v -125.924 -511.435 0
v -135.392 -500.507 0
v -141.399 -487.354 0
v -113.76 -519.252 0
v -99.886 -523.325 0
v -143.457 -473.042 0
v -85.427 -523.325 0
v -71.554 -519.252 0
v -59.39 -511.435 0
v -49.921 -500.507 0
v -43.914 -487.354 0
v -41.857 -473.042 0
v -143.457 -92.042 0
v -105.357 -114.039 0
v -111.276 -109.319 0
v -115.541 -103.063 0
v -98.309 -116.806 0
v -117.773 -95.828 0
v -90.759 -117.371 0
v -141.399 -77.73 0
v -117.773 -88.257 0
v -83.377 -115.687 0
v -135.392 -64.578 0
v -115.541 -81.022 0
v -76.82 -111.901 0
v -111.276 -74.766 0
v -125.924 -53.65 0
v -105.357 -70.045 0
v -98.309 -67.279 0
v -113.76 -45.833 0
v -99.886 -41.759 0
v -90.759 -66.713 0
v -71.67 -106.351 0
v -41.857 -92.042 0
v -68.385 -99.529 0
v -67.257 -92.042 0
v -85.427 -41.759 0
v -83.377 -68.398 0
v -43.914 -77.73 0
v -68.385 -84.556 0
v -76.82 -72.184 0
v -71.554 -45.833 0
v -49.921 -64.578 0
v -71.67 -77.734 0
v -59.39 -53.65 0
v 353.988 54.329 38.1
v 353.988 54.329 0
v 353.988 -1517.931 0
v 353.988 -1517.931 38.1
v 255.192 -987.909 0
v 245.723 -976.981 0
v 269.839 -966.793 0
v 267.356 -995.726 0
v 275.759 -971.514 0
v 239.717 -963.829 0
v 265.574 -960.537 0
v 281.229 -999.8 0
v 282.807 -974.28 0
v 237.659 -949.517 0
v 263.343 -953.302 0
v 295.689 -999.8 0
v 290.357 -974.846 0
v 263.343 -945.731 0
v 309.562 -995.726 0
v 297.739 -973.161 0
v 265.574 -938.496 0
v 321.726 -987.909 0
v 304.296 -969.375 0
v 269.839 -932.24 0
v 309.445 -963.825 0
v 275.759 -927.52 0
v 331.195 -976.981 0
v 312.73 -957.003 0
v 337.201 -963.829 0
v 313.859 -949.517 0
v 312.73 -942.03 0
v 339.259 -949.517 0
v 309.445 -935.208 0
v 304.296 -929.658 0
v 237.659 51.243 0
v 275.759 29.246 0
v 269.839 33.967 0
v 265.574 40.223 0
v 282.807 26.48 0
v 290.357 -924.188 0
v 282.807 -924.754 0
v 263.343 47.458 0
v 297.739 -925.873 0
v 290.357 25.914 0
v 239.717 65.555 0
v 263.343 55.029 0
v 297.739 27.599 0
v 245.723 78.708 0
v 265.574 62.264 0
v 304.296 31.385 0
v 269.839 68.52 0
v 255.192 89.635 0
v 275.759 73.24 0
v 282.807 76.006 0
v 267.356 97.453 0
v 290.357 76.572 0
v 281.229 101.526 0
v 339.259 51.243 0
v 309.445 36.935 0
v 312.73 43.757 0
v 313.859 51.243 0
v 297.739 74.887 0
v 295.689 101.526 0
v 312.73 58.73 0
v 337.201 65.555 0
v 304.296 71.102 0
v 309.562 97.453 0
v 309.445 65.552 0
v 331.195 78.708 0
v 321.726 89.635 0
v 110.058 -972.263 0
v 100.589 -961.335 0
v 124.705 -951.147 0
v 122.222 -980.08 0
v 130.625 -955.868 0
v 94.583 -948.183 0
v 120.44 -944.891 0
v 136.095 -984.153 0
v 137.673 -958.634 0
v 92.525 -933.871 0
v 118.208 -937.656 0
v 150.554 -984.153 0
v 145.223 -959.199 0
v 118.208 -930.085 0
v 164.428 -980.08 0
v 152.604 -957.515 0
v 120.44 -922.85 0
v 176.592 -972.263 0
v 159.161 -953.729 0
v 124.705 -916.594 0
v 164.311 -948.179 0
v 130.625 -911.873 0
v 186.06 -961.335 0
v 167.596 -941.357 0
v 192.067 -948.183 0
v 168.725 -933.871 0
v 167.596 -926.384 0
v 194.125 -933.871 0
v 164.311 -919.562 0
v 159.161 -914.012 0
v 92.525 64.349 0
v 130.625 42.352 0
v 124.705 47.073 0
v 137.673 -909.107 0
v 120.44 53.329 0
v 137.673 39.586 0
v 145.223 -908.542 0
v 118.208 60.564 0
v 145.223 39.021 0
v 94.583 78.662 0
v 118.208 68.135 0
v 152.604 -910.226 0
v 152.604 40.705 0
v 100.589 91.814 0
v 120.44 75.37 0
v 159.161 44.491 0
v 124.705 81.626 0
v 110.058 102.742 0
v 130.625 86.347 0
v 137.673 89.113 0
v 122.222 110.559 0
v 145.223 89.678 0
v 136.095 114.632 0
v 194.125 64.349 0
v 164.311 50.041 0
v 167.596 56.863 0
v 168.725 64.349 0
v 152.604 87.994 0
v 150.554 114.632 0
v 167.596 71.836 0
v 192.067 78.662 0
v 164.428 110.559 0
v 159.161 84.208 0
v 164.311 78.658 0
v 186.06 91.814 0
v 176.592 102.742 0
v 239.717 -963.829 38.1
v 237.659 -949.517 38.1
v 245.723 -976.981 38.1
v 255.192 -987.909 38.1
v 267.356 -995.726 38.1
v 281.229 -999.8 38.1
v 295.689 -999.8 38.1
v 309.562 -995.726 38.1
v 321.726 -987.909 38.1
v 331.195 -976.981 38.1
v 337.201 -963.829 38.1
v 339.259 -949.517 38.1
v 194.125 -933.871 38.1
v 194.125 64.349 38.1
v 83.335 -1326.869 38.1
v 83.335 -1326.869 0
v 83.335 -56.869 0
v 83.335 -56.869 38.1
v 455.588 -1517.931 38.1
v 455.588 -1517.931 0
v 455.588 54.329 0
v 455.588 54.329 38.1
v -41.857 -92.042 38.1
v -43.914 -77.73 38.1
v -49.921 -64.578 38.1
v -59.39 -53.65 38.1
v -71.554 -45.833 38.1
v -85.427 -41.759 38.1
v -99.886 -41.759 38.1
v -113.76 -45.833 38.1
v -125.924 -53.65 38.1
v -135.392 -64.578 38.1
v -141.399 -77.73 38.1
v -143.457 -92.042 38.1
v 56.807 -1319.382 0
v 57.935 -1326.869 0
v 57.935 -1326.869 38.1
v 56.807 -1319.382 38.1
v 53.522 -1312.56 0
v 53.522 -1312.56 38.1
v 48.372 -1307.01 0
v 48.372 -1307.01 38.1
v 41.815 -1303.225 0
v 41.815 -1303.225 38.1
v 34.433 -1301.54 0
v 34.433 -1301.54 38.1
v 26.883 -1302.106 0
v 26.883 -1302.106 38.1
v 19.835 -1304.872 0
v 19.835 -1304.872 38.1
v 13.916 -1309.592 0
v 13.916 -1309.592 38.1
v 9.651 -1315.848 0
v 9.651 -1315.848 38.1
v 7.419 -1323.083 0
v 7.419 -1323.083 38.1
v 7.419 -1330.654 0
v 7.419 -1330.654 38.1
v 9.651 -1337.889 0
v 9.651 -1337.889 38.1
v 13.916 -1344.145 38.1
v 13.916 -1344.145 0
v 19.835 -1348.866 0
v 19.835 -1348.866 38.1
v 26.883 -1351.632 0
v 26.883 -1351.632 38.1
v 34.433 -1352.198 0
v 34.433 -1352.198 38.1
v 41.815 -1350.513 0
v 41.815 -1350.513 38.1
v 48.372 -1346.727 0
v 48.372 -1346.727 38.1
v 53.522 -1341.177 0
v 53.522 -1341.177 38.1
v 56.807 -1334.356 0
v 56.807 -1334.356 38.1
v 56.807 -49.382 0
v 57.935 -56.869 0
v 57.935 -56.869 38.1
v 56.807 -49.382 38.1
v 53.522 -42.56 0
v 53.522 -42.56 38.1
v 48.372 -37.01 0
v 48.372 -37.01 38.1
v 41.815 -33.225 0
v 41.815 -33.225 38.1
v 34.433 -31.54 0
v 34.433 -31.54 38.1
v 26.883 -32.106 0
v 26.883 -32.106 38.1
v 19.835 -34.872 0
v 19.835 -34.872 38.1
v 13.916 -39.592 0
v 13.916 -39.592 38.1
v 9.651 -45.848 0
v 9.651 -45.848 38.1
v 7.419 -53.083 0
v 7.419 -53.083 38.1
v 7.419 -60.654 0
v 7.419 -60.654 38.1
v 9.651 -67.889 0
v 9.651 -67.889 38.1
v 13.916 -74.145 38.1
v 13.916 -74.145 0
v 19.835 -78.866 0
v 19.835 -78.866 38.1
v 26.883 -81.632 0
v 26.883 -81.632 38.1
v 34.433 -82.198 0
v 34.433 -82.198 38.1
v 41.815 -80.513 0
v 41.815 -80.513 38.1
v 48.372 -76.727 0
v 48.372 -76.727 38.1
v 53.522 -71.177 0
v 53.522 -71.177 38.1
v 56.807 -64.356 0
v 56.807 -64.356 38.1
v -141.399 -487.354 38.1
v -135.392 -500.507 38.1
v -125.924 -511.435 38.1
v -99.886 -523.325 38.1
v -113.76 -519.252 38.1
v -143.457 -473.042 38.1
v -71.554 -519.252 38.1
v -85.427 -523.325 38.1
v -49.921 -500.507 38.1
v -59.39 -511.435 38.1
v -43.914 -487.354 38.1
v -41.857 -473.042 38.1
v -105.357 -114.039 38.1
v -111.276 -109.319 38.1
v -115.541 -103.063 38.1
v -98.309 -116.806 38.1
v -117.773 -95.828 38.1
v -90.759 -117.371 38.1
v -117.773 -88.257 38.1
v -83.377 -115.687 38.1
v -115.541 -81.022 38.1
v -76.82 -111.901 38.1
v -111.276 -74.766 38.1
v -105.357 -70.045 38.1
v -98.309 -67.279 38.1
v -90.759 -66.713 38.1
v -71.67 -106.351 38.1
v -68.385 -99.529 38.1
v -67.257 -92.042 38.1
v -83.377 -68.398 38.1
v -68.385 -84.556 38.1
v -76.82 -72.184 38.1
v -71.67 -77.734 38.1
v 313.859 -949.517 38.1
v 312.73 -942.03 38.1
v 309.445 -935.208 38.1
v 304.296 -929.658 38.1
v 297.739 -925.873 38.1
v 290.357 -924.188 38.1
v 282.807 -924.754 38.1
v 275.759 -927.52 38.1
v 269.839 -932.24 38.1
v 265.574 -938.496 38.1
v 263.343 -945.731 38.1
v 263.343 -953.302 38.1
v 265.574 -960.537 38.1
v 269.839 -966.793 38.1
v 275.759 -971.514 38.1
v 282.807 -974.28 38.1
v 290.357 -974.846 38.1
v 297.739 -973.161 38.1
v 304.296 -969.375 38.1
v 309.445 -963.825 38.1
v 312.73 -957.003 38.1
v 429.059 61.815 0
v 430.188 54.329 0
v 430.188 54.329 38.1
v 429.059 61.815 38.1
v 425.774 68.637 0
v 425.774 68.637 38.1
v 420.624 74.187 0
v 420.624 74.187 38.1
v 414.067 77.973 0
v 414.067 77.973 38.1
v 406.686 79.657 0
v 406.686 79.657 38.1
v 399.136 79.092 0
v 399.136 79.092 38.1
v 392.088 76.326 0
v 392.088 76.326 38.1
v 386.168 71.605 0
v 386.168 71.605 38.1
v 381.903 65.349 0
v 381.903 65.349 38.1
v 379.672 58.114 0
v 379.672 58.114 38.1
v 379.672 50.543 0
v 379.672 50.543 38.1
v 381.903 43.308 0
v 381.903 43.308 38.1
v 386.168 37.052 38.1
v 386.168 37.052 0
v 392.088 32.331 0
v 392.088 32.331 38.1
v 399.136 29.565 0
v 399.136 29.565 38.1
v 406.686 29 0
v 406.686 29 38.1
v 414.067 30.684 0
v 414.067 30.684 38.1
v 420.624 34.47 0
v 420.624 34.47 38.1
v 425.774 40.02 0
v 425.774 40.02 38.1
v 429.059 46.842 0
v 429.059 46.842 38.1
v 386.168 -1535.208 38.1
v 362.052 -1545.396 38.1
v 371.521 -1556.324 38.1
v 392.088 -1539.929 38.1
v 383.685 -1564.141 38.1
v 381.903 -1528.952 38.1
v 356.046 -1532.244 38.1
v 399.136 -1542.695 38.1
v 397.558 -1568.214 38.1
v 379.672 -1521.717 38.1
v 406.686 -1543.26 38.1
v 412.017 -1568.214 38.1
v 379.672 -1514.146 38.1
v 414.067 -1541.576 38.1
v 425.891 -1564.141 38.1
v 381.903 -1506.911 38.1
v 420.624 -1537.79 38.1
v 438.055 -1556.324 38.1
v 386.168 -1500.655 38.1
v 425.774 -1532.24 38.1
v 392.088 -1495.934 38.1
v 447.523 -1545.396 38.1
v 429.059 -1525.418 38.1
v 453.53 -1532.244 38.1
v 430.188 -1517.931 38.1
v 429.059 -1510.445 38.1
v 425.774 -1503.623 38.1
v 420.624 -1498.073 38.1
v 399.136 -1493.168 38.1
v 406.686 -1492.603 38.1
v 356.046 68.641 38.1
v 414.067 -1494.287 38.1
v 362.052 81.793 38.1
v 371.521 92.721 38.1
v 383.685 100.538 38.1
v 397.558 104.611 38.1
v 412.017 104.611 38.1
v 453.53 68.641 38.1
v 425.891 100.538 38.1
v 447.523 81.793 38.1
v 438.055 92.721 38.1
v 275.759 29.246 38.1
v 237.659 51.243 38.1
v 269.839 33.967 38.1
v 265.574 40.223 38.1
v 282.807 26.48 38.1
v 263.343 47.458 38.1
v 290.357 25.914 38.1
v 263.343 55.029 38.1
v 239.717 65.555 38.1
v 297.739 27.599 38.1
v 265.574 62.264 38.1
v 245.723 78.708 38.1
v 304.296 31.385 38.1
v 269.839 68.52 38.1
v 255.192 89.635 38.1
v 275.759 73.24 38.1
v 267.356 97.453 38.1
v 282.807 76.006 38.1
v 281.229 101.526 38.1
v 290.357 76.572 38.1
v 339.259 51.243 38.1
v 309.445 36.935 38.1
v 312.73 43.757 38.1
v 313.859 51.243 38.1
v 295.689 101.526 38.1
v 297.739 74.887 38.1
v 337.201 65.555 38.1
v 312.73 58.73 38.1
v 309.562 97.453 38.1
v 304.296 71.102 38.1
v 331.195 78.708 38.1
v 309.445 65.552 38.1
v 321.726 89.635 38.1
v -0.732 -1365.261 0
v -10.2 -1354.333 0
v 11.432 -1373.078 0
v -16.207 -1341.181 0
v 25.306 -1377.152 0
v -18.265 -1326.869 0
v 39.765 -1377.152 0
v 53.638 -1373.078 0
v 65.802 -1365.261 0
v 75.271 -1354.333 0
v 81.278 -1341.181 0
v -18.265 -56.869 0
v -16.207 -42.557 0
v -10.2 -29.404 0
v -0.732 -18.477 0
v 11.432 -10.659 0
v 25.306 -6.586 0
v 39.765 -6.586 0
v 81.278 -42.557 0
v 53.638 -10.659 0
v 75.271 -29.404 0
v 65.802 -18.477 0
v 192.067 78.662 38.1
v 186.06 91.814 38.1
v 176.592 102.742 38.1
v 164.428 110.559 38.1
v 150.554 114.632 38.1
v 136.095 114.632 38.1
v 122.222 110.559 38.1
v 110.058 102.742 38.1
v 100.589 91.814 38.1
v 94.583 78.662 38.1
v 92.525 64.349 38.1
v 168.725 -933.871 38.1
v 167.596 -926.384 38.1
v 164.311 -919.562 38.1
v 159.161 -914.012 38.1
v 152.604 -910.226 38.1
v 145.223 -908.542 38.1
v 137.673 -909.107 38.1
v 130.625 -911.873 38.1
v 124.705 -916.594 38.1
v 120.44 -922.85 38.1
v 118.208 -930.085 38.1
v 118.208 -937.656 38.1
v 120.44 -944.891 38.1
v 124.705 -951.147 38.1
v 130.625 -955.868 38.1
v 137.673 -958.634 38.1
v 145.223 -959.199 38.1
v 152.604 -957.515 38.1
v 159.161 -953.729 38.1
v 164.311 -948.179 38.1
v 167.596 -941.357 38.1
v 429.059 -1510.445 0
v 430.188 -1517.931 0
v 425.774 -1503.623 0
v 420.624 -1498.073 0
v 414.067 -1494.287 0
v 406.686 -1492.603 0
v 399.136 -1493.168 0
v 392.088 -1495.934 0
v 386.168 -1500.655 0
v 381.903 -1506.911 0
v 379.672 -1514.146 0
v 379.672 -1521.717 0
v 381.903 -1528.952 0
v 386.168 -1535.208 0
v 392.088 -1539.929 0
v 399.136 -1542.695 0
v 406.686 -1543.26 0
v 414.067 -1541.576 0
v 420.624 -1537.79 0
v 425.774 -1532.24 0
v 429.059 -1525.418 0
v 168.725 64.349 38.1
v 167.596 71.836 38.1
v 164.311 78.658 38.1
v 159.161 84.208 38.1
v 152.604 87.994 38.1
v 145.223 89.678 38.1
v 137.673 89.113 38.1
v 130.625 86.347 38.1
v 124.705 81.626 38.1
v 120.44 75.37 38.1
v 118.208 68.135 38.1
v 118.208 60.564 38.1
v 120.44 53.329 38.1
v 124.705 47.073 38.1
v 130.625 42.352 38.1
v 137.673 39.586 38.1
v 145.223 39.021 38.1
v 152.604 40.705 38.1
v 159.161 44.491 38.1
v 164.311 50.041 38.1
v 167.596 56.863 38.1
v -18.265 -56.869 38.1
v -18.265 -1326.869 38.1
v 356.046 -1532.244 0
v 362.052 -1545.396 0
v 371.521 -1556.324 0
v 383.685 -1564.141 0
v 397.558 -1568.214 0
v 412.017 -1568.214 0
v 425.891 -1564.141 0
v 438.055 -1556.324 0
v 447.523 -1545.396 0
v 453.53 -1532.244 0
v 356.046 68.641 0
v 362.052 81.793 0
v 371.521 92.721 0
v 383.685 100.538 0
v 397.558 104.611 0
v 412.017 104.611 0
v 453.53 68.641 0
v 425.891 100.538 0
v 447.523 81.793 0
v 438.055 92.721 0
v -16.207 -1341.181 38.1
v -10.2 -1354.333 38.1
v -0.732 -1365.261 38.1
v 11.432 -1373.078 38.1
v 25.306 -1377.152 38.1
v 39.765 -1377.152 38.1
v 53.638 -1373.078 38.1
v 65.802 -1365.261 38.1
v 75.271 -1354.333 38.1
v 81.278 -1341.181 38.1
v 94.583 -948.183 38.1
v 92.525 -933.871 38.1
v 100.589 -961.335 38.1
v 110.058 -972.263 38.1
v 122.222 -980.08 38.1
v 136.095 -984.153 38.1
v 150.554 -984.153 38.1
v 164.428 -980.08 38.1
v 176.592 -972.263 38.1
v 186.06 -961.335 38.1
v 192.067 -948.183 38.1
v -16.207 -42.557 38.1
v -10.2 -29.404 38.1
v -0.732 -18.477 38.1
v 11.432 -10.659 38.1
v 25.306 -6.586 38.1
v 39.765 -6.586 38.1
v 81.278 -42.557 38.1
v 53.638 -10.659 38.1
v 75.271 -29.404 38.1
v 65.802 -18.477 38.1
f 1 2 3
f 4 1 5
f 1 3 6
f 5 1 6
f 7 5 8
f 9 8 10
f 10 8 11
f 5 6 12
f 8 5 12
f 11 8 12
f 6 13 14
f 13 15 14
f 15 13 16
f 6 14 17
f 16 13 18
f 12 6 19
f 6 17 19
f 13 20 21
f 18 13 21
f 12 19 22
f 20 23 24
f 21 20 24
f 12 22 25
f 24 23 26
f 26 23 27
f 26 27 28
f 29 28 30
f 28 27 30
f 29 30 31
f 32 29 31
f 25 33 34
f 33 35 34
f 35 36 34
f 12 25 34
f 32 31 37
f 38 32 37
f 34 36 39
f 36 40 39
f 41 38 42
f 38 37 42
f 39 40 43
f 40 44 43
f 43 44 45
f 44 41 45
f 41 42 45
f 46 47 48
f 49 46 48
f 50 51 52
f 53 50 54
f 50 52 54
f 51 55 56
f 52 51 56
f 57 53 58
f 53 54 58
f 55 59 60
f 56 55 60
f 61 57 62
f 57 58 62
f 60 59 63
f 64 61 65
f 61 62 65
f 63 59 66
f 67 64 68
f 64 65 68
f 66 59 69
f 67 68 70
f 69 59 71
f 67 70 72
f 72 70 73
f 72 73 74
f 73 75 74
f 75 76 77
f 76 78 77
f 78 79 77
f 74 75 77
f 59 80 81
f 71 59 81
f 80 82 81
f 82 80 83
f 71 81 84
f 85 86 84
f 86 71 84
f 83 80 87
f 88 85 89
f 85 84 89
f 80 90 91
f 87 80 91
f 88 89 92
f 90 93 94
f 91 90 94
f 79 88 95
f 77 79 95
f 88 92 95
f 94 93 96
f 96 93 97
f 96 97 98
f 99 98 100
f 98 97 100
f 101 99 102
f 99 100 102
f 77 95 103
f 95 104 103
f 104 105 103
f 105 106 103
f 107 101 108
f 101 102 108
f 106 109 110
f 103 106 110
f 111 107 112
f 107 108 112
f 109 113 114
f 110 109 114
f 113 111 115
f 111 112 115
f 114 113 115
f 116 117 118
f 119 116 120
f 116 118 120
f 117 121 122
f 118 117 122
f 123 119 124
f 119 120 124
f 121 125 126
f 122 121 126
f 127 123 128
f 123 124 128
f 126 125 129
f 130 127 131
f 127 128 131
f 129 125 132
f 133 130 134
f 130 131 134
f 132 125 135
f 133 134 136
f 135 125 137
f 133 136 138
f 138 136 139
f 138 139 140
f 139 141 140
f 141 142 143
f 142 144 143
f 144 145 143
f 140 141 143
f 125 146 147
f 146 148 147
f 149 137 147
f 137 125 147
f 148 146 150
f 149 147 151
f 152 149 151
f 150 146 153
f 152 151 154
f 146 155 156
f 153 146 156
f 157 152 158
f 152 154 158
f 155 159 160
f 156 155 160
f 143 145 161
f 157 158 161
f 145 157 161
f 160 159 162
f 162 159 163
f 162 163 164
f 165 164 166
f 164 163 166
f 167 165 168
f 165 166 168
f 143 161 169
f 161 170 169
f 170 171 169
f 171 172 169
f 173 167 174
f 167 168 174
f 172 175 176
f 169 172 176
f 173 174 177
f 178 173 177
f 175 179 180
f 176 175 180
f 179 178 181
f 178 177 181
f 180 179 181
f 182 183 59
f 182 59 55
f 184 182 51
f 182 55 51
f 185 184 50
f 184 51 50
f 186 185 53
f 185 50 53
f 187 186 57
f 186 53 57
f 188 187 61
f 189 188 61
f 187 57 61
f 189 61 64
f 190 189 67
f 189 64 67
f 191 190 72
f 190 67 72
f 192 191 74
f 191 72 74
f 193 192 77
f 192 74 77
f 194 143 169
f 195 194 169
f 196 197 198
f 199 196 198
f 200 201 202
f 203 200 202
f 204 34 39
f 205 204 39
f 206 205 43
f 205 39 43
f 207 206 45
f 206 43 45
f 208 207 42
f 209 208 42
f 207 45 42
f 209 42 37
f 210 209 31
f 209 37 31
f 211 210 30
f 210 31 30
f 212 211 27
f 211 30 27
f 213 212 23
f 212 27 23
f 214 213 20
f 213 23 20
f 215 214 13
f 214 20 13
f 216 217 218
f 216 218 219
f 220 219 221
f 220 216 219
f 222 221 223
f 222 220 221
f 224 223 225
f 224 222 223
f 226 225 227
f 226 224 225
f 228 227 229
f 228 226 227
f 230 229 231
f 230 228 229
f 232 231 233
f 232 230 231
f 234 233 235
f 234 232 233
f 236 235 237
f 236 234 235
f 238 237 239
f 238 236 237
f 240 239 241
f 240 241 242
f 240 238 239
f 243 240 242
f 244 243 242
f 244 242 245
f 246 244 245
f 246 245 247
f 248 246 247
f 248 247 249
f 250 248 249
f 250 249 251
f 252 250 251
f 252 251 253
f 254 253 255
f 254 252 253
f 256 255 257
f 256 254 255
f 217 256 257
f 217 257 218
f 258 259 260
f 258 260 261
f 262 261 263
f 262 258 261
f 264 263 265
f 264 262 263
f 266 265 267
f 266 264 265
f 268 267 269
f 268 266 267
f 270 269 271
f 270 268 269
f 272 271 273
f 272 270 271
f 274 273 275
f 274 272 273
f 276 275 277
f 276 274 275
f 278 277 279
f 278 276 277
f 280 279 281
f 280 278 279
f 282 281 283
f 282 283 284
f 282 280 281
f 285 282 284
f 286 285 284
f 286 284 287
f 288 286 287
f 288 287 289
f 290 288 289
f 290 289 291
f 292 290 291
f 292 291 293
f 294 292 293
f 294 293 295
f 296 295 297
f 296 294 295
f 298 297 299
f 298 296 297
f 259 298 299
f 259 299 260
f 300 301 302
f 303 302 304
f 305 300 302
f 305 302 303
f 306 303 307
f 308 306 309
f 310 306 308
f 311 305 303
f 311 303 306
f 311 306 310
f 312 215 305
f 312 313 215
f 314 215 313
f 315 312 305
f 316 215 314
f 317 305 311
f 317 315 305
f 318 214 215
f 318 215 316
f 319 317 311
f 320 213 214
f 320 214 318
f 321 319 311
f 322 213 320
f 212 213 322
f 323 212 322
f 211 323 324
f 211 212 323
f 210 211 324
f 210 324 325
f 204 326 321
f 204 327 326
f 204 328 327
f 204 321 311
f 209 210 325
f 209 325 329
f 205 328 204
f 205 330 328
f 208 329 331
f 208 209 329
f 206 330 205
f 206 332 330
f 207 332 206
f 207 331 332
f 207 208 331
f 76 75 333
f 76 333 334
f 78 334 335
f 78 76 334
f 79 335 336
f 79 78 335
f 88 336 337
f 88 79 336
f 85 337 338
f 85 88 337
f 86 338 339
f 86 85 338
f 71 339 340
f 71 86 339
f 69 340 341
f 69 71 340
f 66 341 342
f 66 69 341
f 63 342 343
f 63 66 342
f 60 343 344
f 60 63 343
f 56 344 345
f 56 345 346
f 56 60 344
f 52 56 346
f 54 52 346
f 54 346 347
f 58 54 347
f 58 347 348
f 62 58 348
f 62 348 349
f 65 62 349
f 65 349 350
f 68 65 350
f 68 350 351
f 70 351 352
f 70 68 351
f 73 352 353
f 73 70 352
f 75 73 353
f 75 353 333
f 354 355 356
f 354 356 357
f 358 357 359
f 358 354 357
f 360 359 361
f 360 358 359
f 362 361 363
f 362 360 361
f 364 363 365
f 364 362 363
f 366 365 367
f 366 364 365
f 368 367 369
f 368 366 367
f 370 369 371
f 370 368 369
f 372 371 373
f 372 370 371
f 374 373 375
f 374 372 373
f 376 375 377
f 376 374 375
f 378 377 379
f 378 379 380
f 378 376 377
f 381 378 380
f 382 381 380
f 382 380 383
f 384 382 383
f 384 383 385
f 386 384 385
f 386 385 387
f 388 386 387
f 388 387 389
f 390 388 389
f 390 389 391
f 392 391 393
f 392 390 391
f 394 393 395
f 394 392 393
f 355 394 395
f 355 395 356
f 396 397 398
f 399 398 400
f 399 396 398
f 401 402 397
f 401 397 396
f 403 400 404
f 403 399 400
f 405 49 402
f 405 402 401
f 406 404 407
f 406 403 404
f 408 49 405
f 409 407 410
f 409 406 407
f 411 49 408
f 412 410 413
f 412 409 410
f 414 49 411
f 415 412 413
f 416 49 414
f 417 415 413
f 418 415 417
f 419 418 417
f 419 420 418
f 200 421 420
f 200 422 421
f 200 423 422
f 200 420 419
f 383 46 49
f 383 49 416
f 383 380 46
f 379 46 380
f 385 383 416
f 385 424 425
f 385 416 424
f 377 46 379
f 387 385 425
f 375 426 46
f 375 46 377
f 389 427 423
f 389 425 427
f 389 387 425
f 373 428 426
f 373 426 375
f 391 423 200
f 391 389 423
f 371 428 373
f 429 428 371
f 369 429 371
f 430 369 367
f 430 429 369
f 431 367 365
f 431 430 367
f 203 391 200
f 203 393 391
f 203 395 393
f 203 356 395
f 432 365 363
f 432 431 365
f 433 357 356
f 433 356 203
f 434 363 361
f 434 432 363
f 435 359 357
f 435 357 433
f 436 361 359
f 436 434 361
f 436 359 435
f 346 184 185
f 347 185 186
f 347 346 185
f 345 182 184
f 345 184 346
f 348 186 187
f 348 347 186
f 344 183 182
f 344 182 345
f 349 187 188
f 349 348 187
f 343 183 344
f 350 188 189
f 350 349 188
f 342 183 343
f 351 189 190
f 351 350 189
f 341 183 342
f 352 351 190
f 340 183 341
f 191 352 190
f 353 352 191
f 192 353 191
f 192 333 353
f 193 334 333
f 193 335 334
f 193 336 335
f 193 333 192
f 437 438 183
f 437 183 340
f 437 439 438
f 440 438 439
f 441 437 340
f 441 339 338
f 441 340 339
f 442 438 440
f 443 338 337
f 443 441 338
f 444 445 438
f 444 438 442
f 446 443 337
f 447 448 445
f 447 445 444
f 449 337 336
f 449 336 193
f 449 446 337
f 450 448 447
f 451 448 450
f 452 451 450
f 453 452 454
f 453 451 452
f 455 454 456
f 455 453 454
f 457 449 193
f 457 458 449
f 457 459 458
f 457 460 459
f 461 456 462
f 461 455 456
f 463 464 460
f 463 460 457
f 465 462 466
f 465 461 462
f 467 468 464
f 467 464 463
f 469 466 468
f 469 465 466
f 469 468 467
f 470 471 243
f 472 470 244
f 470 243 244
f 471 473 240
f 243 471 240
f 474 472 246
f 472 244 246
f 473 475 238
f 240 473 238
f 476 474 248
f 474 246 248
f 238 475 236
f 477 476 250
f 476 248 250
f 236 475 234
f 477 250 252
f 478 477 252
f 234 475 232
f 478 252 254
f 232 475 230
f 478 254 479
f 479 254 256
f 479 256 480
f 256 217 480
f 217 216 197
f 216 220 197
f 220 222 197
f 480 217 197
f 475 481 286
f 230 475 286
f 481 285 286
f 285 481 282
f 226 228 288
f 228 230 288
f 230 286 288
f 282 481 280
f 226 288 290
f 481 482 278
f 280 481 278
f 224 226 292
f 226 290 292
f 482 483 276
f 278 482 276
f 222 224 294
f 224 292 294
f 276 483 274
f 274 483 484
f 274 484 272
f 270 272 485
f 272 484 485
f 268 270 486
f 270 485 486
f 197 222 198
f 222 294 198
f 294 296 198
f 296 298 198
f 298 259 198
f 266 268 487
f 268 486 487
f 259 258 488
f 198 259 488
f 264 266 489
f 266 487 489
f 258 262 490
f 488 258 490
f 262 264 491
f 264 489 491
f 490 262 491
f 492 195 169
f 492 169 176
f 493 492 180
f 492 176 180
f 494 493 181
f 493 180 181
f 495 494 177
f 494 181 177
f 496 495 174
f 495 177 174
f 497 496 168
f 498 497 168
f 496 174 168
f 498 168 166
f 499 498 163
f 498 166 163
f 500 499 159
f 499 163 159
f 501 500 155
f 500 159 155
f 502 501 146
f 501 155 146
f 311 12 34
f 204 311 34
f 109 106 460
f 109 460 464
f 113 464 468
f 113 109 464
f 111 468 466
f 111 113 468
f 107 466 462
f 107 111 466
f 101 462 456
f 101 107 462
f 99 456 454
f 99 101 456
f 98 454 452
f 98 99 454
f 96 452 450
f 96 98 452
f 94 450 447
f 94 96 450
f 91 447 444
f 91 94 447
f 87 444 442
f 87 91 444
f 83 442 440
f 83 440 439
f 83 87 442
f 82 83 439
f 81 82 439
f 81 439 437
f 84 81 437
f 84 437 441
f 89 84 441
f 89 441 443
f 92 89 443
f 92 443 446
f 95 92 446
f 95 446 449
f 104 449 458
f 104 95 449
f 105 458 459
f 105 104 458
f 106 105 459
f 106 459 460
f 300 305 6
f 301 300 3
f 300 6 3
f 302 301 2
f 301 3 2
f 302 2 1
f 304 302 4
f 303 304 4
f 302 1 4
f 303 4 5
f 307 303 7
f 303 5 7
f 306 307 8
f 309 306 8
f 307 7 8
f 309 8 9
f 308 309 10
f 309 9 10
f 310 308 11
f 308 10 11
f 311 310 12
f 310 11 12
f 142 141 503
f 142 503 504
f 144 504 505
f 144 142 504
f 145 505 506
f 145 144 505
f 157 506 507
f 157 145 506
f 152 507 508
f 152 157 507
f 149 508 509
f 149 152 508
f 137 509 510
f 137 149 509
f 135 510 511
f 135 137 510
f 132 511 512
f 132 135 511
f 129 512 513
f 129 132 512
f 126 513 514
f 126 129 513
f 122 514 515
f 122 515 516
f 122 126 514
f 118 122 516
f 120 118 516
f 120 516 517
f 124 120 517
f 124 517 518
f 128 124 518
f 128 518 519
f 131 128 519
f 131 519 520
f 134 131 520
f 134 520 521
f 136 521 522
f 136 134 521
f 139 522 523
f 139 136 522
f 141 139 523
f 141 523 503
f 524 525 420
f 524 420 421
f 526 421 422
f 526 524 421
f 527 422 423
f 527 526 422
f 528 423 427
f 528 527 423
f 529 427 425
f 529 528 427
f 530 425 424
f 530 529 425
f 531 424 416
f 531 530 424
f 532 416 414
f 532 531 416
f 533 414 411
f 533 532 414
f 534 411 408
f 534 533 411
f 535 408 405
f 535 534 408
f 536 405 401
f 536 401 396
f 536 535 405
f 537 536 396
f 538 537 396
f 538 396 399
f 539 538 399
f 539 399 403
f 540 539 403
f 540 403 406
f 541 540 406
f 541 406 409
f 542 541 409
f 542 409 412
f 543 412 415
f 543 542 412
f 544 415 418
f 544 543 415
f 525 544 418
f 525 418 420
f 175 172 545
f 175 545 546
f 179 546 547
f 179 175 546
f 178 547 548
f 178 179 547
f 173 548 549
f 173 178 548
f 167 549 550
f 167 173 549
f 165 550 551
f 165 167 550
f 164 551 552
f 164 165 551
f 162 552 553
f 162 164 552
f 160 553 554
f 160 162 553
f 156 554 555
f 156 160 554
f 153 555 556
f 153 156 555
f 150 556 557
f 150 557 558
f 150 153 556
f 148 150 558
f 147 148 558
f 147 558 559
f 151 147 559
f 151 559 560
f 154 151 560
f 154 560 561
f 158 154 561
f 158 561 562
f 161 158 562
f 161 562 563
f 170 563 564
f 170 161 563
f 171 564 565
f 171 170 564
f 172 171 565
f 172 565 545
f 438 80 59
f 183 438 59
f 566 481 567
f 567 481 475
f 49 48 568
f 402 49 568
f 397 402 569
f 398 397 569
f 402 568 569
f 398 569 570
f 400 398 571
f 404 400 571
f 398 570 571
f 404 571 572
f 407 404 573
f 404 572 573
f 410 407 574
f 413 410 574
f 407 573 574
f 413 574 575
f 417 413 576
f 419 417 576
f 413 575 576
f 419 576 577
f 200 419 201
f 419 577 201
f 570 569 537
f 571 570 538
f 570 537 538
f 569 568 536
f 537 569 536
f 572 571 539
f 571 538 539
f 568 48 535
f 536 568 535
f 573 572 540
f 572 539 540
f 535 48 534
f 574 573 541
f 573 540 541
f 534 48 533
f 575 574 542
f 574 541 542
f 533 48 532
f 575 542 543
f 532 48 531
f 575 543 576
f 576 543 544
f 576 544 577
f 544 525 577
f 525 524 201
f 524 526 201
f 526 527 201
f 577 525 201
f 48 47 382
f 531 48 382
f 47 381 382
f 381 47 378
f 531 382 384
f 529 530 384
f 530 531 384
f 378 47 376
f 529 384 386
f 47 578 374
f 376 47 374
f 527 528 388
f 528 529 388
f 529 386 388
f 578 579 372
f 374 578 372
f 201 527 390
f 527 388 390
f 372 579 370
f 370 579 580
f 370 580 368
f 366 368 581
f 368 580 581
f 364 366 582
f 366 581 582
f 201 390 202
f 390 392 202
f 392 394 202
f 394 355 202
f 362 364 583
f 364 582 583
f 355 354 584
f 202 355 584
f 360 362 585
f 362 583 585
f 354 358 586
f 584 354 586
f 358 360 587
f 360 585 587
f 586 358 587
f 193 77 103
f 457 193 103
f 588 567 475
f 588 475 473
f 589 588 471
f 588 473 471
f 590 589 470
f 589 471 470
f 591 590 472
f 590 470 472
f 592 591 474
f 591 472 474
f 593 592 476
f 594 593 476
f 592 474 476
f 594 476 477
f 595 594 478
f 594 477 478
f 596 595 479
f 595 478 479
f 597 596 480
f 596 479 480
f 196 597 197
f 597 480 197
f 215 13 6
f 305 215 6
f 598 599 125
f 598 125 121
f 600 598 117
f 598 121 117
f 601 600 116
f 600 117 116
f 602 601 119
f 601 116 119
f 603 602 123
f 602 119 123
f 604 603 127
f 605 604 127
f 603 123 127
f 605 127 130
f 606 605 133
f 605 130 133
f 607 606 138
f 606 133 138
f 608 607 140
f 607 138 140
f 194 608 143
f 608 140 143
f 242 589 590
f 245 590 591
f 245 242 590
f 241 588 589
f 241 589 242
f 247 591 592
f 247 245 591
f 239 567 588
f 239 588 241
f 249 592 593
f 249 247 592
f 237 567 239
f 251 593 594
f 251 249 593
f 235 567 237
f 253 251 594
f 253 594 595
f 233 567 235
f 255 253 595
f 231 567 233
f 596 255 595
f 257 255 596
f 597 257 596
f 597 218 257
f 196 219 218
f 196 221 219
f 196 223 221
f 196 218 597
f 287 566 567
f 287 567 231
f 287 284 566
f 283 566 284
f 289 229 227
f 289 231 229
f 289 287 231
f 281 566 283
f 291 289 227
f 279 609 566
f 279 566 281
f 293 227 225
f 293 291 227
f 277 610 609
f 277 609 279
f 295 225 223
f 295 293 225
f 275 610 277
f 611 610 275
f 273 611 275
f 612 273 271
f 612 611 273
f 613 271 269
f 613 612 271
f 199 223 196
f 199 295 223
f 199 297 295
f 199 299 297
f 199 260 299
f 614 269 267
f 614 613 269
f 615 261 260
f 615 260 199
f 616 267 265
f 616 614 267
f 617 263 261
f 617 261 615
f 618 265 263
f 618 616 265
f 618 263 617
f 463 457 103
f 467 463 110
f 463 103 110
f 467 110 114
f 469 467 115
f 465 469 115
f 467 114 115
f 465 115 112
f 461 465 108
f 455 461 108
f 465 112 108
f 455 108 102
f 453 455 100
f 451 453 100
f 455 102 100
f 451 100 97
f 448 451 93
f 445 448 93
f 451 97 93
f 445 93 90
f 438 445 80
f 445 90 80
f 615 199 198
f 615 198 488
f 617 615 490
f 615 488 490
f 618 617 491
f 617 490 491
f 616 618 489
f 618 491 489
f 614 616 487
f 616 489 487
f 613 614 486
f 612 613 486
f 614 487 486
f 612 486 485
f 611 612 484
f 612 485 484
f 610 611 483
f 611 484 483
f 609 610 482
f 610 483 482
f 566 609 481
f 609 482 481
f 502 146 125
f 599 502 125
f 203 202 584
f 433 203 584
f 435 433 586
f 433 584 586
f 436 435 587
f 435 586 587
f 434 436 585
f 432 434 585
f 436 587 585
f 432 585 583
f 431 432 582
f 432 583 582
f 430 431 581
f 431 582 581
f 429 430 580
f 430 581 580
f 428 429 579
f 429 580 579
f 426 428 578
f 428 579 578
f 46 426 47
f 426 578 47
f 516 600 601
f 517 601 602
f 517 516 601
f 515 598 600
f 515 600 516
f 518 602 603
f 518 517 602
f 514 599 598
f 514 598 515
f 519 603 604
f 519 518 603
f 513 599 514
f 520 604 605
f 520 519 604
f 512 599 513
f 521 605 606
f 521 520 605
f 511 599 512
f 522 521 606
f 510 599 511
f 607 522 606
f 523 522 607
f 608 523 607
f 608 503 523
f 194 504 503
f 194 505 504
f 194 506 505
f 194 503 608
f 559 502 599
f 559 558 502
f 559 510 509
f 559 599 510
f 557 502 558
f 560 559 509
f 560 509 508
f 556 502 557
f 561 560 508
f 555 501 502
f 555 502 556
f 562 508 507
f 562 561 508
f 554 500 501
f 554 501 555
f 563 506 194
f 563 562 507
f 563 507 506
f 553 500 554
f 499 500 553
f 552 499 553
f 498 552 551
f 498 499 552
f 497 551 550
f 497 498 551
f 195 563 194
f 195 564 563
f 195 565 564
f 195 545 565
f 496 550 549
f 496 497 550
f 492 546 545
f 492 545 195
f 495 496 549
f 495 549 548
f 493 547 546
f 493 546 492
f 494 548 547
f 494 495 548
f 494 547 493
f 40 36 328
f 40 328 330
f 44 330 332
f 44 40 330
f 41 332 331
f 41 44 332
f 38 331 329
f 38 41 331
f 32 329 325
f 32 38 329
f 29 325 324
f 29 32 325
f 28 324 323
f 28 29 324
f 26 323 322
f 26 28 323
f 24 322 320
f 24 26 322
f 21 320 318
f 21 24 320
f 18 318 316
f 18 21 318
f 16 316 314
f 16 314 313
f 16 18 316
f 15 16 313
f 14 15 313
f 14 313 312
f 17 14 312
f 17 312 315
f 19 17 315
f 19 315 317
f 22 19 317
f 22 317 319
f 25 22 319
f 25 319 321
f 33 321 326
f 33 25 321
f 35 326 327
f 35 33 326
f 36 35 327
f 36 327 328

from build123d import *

# Parameters (mm, degrees)
F0_R     = 25.4
F1_DEPTH = 38.1


with BuildPart() as f1:
    # F0 (on Top) → F1 (new body)
    with BuildSketch(Plane.XY):
        with BuildLine():
            Line((-143.456717, -92.042427), (-143.456717, -473.042427))
            ThreePointArc((-143.456717, -473.042427), (-92.656717, -523.842427), (-41.856717, -473.042427))
            Line((-41.856717, -473.042427), (-41.856717, -92.042427))
            ThreePointArc((-41.856717, -92.042427), (-92.656717, -41.242427), (-143.456717, -92.042427))
        make_face()
        with Locations((-92.656717, -473.042427)):
            Circle(F0_R, mode=Mode.SUBTRACT)
        with Locations((-92.656717, -92.042427)):
            Circle(F0_R, mode=Mode.SUBTRACT)
        with BuildLine():
            Line((-18.264667, -56.868742), (-18.264667, -1326.868742))
            ThreePointArc((-18.264667, -1326.868742), (32.535333, -1377.668742), (83.335333, -1326.868742))
            Line((83.335333, -1326.868742), (83.335333, -56.868742))
            ThreePointArc((83.335333, -56.868742), (32.535333, -6.068742), (-18.264667, -56.868742))
        make_face()
        with Locations((32.535333, -1326.868742)):
            Circle(F0_R, mode=Mode.SUBTRACT)
        with Locations((32.535333, -56.868742)):
            Circle(F0_R, mode=Mode.SUBTRACT)
        with BuildLine():
            Line((92.524763, 64.349489), (92.524763, -933.870511))
            ThreePointArc((92.524763, -933.870511), (143.324763, -984.670511), (194.124763, -933.870511))
            Line((194.124763, -933.870511), (194.124763, 64.349489))
            ThreePointArc((194.124763, 64.349489), (143.324763, 115.149489), (92.524763, 64.349489))
        make_face()
        with Locations((143.324763, -933.870511)):
            Circle(F0_R, mode=Mode.SUBTRACT)
        with Locations((143.324763, 64.349489)):
            Circle(F0_R, mode=Mode.SUBTRACT)
        with BuildLine():
            Line((237.658914, 51.24329), (237.658914, -949.51671))
            ThreePointArc((237.658914, -949.51671), (288.458914, -1000.31671), (339.258914, -949.51671))
            Line((339.258914, -949.51671), (339.258914, 51.24329))
            ThreePointArc((339.258914, 51.24329), (288.458914, 102.04329), (237.658914, 51.24329))
        make_face()
        with Locations((288.458914, -949.51671)):
            Circle(F0_R, mode=Mode.SUBTRACT)
        with Locations((288.458914, 51.24329)):
            Circle(F0_R, mode=Mode.SUBTRACT)
        with BuildLine():
            Line((353.987809, 54.328505), (353.987809, -1517.931495))
            ThreePointArc((353.987809, -1517.931495), (404.787809, -1568.731495), (455.587809, -1517.931495))
            Line((455.587809, -1517.931495), (455.587809, 54.328505))
            ThreePointArc((455.587809, 54.328505), (404.787809, 105.128505), (353.987809, 54.328505))
        make_face()
        with Locations((404.787809, -1517.931495)):
            Circle(F0_R, mode=Mode.SUBTRACT)
        with Locations((404.787809, 54.328505)):
            Circle(F0_R, mode=Mode.SUBTRACT)
        with Locations((-92.656717, -473.042427)):
            Circle(F0_R)
    extrude(amount=F1_DEPTH)


solid = f1.part
